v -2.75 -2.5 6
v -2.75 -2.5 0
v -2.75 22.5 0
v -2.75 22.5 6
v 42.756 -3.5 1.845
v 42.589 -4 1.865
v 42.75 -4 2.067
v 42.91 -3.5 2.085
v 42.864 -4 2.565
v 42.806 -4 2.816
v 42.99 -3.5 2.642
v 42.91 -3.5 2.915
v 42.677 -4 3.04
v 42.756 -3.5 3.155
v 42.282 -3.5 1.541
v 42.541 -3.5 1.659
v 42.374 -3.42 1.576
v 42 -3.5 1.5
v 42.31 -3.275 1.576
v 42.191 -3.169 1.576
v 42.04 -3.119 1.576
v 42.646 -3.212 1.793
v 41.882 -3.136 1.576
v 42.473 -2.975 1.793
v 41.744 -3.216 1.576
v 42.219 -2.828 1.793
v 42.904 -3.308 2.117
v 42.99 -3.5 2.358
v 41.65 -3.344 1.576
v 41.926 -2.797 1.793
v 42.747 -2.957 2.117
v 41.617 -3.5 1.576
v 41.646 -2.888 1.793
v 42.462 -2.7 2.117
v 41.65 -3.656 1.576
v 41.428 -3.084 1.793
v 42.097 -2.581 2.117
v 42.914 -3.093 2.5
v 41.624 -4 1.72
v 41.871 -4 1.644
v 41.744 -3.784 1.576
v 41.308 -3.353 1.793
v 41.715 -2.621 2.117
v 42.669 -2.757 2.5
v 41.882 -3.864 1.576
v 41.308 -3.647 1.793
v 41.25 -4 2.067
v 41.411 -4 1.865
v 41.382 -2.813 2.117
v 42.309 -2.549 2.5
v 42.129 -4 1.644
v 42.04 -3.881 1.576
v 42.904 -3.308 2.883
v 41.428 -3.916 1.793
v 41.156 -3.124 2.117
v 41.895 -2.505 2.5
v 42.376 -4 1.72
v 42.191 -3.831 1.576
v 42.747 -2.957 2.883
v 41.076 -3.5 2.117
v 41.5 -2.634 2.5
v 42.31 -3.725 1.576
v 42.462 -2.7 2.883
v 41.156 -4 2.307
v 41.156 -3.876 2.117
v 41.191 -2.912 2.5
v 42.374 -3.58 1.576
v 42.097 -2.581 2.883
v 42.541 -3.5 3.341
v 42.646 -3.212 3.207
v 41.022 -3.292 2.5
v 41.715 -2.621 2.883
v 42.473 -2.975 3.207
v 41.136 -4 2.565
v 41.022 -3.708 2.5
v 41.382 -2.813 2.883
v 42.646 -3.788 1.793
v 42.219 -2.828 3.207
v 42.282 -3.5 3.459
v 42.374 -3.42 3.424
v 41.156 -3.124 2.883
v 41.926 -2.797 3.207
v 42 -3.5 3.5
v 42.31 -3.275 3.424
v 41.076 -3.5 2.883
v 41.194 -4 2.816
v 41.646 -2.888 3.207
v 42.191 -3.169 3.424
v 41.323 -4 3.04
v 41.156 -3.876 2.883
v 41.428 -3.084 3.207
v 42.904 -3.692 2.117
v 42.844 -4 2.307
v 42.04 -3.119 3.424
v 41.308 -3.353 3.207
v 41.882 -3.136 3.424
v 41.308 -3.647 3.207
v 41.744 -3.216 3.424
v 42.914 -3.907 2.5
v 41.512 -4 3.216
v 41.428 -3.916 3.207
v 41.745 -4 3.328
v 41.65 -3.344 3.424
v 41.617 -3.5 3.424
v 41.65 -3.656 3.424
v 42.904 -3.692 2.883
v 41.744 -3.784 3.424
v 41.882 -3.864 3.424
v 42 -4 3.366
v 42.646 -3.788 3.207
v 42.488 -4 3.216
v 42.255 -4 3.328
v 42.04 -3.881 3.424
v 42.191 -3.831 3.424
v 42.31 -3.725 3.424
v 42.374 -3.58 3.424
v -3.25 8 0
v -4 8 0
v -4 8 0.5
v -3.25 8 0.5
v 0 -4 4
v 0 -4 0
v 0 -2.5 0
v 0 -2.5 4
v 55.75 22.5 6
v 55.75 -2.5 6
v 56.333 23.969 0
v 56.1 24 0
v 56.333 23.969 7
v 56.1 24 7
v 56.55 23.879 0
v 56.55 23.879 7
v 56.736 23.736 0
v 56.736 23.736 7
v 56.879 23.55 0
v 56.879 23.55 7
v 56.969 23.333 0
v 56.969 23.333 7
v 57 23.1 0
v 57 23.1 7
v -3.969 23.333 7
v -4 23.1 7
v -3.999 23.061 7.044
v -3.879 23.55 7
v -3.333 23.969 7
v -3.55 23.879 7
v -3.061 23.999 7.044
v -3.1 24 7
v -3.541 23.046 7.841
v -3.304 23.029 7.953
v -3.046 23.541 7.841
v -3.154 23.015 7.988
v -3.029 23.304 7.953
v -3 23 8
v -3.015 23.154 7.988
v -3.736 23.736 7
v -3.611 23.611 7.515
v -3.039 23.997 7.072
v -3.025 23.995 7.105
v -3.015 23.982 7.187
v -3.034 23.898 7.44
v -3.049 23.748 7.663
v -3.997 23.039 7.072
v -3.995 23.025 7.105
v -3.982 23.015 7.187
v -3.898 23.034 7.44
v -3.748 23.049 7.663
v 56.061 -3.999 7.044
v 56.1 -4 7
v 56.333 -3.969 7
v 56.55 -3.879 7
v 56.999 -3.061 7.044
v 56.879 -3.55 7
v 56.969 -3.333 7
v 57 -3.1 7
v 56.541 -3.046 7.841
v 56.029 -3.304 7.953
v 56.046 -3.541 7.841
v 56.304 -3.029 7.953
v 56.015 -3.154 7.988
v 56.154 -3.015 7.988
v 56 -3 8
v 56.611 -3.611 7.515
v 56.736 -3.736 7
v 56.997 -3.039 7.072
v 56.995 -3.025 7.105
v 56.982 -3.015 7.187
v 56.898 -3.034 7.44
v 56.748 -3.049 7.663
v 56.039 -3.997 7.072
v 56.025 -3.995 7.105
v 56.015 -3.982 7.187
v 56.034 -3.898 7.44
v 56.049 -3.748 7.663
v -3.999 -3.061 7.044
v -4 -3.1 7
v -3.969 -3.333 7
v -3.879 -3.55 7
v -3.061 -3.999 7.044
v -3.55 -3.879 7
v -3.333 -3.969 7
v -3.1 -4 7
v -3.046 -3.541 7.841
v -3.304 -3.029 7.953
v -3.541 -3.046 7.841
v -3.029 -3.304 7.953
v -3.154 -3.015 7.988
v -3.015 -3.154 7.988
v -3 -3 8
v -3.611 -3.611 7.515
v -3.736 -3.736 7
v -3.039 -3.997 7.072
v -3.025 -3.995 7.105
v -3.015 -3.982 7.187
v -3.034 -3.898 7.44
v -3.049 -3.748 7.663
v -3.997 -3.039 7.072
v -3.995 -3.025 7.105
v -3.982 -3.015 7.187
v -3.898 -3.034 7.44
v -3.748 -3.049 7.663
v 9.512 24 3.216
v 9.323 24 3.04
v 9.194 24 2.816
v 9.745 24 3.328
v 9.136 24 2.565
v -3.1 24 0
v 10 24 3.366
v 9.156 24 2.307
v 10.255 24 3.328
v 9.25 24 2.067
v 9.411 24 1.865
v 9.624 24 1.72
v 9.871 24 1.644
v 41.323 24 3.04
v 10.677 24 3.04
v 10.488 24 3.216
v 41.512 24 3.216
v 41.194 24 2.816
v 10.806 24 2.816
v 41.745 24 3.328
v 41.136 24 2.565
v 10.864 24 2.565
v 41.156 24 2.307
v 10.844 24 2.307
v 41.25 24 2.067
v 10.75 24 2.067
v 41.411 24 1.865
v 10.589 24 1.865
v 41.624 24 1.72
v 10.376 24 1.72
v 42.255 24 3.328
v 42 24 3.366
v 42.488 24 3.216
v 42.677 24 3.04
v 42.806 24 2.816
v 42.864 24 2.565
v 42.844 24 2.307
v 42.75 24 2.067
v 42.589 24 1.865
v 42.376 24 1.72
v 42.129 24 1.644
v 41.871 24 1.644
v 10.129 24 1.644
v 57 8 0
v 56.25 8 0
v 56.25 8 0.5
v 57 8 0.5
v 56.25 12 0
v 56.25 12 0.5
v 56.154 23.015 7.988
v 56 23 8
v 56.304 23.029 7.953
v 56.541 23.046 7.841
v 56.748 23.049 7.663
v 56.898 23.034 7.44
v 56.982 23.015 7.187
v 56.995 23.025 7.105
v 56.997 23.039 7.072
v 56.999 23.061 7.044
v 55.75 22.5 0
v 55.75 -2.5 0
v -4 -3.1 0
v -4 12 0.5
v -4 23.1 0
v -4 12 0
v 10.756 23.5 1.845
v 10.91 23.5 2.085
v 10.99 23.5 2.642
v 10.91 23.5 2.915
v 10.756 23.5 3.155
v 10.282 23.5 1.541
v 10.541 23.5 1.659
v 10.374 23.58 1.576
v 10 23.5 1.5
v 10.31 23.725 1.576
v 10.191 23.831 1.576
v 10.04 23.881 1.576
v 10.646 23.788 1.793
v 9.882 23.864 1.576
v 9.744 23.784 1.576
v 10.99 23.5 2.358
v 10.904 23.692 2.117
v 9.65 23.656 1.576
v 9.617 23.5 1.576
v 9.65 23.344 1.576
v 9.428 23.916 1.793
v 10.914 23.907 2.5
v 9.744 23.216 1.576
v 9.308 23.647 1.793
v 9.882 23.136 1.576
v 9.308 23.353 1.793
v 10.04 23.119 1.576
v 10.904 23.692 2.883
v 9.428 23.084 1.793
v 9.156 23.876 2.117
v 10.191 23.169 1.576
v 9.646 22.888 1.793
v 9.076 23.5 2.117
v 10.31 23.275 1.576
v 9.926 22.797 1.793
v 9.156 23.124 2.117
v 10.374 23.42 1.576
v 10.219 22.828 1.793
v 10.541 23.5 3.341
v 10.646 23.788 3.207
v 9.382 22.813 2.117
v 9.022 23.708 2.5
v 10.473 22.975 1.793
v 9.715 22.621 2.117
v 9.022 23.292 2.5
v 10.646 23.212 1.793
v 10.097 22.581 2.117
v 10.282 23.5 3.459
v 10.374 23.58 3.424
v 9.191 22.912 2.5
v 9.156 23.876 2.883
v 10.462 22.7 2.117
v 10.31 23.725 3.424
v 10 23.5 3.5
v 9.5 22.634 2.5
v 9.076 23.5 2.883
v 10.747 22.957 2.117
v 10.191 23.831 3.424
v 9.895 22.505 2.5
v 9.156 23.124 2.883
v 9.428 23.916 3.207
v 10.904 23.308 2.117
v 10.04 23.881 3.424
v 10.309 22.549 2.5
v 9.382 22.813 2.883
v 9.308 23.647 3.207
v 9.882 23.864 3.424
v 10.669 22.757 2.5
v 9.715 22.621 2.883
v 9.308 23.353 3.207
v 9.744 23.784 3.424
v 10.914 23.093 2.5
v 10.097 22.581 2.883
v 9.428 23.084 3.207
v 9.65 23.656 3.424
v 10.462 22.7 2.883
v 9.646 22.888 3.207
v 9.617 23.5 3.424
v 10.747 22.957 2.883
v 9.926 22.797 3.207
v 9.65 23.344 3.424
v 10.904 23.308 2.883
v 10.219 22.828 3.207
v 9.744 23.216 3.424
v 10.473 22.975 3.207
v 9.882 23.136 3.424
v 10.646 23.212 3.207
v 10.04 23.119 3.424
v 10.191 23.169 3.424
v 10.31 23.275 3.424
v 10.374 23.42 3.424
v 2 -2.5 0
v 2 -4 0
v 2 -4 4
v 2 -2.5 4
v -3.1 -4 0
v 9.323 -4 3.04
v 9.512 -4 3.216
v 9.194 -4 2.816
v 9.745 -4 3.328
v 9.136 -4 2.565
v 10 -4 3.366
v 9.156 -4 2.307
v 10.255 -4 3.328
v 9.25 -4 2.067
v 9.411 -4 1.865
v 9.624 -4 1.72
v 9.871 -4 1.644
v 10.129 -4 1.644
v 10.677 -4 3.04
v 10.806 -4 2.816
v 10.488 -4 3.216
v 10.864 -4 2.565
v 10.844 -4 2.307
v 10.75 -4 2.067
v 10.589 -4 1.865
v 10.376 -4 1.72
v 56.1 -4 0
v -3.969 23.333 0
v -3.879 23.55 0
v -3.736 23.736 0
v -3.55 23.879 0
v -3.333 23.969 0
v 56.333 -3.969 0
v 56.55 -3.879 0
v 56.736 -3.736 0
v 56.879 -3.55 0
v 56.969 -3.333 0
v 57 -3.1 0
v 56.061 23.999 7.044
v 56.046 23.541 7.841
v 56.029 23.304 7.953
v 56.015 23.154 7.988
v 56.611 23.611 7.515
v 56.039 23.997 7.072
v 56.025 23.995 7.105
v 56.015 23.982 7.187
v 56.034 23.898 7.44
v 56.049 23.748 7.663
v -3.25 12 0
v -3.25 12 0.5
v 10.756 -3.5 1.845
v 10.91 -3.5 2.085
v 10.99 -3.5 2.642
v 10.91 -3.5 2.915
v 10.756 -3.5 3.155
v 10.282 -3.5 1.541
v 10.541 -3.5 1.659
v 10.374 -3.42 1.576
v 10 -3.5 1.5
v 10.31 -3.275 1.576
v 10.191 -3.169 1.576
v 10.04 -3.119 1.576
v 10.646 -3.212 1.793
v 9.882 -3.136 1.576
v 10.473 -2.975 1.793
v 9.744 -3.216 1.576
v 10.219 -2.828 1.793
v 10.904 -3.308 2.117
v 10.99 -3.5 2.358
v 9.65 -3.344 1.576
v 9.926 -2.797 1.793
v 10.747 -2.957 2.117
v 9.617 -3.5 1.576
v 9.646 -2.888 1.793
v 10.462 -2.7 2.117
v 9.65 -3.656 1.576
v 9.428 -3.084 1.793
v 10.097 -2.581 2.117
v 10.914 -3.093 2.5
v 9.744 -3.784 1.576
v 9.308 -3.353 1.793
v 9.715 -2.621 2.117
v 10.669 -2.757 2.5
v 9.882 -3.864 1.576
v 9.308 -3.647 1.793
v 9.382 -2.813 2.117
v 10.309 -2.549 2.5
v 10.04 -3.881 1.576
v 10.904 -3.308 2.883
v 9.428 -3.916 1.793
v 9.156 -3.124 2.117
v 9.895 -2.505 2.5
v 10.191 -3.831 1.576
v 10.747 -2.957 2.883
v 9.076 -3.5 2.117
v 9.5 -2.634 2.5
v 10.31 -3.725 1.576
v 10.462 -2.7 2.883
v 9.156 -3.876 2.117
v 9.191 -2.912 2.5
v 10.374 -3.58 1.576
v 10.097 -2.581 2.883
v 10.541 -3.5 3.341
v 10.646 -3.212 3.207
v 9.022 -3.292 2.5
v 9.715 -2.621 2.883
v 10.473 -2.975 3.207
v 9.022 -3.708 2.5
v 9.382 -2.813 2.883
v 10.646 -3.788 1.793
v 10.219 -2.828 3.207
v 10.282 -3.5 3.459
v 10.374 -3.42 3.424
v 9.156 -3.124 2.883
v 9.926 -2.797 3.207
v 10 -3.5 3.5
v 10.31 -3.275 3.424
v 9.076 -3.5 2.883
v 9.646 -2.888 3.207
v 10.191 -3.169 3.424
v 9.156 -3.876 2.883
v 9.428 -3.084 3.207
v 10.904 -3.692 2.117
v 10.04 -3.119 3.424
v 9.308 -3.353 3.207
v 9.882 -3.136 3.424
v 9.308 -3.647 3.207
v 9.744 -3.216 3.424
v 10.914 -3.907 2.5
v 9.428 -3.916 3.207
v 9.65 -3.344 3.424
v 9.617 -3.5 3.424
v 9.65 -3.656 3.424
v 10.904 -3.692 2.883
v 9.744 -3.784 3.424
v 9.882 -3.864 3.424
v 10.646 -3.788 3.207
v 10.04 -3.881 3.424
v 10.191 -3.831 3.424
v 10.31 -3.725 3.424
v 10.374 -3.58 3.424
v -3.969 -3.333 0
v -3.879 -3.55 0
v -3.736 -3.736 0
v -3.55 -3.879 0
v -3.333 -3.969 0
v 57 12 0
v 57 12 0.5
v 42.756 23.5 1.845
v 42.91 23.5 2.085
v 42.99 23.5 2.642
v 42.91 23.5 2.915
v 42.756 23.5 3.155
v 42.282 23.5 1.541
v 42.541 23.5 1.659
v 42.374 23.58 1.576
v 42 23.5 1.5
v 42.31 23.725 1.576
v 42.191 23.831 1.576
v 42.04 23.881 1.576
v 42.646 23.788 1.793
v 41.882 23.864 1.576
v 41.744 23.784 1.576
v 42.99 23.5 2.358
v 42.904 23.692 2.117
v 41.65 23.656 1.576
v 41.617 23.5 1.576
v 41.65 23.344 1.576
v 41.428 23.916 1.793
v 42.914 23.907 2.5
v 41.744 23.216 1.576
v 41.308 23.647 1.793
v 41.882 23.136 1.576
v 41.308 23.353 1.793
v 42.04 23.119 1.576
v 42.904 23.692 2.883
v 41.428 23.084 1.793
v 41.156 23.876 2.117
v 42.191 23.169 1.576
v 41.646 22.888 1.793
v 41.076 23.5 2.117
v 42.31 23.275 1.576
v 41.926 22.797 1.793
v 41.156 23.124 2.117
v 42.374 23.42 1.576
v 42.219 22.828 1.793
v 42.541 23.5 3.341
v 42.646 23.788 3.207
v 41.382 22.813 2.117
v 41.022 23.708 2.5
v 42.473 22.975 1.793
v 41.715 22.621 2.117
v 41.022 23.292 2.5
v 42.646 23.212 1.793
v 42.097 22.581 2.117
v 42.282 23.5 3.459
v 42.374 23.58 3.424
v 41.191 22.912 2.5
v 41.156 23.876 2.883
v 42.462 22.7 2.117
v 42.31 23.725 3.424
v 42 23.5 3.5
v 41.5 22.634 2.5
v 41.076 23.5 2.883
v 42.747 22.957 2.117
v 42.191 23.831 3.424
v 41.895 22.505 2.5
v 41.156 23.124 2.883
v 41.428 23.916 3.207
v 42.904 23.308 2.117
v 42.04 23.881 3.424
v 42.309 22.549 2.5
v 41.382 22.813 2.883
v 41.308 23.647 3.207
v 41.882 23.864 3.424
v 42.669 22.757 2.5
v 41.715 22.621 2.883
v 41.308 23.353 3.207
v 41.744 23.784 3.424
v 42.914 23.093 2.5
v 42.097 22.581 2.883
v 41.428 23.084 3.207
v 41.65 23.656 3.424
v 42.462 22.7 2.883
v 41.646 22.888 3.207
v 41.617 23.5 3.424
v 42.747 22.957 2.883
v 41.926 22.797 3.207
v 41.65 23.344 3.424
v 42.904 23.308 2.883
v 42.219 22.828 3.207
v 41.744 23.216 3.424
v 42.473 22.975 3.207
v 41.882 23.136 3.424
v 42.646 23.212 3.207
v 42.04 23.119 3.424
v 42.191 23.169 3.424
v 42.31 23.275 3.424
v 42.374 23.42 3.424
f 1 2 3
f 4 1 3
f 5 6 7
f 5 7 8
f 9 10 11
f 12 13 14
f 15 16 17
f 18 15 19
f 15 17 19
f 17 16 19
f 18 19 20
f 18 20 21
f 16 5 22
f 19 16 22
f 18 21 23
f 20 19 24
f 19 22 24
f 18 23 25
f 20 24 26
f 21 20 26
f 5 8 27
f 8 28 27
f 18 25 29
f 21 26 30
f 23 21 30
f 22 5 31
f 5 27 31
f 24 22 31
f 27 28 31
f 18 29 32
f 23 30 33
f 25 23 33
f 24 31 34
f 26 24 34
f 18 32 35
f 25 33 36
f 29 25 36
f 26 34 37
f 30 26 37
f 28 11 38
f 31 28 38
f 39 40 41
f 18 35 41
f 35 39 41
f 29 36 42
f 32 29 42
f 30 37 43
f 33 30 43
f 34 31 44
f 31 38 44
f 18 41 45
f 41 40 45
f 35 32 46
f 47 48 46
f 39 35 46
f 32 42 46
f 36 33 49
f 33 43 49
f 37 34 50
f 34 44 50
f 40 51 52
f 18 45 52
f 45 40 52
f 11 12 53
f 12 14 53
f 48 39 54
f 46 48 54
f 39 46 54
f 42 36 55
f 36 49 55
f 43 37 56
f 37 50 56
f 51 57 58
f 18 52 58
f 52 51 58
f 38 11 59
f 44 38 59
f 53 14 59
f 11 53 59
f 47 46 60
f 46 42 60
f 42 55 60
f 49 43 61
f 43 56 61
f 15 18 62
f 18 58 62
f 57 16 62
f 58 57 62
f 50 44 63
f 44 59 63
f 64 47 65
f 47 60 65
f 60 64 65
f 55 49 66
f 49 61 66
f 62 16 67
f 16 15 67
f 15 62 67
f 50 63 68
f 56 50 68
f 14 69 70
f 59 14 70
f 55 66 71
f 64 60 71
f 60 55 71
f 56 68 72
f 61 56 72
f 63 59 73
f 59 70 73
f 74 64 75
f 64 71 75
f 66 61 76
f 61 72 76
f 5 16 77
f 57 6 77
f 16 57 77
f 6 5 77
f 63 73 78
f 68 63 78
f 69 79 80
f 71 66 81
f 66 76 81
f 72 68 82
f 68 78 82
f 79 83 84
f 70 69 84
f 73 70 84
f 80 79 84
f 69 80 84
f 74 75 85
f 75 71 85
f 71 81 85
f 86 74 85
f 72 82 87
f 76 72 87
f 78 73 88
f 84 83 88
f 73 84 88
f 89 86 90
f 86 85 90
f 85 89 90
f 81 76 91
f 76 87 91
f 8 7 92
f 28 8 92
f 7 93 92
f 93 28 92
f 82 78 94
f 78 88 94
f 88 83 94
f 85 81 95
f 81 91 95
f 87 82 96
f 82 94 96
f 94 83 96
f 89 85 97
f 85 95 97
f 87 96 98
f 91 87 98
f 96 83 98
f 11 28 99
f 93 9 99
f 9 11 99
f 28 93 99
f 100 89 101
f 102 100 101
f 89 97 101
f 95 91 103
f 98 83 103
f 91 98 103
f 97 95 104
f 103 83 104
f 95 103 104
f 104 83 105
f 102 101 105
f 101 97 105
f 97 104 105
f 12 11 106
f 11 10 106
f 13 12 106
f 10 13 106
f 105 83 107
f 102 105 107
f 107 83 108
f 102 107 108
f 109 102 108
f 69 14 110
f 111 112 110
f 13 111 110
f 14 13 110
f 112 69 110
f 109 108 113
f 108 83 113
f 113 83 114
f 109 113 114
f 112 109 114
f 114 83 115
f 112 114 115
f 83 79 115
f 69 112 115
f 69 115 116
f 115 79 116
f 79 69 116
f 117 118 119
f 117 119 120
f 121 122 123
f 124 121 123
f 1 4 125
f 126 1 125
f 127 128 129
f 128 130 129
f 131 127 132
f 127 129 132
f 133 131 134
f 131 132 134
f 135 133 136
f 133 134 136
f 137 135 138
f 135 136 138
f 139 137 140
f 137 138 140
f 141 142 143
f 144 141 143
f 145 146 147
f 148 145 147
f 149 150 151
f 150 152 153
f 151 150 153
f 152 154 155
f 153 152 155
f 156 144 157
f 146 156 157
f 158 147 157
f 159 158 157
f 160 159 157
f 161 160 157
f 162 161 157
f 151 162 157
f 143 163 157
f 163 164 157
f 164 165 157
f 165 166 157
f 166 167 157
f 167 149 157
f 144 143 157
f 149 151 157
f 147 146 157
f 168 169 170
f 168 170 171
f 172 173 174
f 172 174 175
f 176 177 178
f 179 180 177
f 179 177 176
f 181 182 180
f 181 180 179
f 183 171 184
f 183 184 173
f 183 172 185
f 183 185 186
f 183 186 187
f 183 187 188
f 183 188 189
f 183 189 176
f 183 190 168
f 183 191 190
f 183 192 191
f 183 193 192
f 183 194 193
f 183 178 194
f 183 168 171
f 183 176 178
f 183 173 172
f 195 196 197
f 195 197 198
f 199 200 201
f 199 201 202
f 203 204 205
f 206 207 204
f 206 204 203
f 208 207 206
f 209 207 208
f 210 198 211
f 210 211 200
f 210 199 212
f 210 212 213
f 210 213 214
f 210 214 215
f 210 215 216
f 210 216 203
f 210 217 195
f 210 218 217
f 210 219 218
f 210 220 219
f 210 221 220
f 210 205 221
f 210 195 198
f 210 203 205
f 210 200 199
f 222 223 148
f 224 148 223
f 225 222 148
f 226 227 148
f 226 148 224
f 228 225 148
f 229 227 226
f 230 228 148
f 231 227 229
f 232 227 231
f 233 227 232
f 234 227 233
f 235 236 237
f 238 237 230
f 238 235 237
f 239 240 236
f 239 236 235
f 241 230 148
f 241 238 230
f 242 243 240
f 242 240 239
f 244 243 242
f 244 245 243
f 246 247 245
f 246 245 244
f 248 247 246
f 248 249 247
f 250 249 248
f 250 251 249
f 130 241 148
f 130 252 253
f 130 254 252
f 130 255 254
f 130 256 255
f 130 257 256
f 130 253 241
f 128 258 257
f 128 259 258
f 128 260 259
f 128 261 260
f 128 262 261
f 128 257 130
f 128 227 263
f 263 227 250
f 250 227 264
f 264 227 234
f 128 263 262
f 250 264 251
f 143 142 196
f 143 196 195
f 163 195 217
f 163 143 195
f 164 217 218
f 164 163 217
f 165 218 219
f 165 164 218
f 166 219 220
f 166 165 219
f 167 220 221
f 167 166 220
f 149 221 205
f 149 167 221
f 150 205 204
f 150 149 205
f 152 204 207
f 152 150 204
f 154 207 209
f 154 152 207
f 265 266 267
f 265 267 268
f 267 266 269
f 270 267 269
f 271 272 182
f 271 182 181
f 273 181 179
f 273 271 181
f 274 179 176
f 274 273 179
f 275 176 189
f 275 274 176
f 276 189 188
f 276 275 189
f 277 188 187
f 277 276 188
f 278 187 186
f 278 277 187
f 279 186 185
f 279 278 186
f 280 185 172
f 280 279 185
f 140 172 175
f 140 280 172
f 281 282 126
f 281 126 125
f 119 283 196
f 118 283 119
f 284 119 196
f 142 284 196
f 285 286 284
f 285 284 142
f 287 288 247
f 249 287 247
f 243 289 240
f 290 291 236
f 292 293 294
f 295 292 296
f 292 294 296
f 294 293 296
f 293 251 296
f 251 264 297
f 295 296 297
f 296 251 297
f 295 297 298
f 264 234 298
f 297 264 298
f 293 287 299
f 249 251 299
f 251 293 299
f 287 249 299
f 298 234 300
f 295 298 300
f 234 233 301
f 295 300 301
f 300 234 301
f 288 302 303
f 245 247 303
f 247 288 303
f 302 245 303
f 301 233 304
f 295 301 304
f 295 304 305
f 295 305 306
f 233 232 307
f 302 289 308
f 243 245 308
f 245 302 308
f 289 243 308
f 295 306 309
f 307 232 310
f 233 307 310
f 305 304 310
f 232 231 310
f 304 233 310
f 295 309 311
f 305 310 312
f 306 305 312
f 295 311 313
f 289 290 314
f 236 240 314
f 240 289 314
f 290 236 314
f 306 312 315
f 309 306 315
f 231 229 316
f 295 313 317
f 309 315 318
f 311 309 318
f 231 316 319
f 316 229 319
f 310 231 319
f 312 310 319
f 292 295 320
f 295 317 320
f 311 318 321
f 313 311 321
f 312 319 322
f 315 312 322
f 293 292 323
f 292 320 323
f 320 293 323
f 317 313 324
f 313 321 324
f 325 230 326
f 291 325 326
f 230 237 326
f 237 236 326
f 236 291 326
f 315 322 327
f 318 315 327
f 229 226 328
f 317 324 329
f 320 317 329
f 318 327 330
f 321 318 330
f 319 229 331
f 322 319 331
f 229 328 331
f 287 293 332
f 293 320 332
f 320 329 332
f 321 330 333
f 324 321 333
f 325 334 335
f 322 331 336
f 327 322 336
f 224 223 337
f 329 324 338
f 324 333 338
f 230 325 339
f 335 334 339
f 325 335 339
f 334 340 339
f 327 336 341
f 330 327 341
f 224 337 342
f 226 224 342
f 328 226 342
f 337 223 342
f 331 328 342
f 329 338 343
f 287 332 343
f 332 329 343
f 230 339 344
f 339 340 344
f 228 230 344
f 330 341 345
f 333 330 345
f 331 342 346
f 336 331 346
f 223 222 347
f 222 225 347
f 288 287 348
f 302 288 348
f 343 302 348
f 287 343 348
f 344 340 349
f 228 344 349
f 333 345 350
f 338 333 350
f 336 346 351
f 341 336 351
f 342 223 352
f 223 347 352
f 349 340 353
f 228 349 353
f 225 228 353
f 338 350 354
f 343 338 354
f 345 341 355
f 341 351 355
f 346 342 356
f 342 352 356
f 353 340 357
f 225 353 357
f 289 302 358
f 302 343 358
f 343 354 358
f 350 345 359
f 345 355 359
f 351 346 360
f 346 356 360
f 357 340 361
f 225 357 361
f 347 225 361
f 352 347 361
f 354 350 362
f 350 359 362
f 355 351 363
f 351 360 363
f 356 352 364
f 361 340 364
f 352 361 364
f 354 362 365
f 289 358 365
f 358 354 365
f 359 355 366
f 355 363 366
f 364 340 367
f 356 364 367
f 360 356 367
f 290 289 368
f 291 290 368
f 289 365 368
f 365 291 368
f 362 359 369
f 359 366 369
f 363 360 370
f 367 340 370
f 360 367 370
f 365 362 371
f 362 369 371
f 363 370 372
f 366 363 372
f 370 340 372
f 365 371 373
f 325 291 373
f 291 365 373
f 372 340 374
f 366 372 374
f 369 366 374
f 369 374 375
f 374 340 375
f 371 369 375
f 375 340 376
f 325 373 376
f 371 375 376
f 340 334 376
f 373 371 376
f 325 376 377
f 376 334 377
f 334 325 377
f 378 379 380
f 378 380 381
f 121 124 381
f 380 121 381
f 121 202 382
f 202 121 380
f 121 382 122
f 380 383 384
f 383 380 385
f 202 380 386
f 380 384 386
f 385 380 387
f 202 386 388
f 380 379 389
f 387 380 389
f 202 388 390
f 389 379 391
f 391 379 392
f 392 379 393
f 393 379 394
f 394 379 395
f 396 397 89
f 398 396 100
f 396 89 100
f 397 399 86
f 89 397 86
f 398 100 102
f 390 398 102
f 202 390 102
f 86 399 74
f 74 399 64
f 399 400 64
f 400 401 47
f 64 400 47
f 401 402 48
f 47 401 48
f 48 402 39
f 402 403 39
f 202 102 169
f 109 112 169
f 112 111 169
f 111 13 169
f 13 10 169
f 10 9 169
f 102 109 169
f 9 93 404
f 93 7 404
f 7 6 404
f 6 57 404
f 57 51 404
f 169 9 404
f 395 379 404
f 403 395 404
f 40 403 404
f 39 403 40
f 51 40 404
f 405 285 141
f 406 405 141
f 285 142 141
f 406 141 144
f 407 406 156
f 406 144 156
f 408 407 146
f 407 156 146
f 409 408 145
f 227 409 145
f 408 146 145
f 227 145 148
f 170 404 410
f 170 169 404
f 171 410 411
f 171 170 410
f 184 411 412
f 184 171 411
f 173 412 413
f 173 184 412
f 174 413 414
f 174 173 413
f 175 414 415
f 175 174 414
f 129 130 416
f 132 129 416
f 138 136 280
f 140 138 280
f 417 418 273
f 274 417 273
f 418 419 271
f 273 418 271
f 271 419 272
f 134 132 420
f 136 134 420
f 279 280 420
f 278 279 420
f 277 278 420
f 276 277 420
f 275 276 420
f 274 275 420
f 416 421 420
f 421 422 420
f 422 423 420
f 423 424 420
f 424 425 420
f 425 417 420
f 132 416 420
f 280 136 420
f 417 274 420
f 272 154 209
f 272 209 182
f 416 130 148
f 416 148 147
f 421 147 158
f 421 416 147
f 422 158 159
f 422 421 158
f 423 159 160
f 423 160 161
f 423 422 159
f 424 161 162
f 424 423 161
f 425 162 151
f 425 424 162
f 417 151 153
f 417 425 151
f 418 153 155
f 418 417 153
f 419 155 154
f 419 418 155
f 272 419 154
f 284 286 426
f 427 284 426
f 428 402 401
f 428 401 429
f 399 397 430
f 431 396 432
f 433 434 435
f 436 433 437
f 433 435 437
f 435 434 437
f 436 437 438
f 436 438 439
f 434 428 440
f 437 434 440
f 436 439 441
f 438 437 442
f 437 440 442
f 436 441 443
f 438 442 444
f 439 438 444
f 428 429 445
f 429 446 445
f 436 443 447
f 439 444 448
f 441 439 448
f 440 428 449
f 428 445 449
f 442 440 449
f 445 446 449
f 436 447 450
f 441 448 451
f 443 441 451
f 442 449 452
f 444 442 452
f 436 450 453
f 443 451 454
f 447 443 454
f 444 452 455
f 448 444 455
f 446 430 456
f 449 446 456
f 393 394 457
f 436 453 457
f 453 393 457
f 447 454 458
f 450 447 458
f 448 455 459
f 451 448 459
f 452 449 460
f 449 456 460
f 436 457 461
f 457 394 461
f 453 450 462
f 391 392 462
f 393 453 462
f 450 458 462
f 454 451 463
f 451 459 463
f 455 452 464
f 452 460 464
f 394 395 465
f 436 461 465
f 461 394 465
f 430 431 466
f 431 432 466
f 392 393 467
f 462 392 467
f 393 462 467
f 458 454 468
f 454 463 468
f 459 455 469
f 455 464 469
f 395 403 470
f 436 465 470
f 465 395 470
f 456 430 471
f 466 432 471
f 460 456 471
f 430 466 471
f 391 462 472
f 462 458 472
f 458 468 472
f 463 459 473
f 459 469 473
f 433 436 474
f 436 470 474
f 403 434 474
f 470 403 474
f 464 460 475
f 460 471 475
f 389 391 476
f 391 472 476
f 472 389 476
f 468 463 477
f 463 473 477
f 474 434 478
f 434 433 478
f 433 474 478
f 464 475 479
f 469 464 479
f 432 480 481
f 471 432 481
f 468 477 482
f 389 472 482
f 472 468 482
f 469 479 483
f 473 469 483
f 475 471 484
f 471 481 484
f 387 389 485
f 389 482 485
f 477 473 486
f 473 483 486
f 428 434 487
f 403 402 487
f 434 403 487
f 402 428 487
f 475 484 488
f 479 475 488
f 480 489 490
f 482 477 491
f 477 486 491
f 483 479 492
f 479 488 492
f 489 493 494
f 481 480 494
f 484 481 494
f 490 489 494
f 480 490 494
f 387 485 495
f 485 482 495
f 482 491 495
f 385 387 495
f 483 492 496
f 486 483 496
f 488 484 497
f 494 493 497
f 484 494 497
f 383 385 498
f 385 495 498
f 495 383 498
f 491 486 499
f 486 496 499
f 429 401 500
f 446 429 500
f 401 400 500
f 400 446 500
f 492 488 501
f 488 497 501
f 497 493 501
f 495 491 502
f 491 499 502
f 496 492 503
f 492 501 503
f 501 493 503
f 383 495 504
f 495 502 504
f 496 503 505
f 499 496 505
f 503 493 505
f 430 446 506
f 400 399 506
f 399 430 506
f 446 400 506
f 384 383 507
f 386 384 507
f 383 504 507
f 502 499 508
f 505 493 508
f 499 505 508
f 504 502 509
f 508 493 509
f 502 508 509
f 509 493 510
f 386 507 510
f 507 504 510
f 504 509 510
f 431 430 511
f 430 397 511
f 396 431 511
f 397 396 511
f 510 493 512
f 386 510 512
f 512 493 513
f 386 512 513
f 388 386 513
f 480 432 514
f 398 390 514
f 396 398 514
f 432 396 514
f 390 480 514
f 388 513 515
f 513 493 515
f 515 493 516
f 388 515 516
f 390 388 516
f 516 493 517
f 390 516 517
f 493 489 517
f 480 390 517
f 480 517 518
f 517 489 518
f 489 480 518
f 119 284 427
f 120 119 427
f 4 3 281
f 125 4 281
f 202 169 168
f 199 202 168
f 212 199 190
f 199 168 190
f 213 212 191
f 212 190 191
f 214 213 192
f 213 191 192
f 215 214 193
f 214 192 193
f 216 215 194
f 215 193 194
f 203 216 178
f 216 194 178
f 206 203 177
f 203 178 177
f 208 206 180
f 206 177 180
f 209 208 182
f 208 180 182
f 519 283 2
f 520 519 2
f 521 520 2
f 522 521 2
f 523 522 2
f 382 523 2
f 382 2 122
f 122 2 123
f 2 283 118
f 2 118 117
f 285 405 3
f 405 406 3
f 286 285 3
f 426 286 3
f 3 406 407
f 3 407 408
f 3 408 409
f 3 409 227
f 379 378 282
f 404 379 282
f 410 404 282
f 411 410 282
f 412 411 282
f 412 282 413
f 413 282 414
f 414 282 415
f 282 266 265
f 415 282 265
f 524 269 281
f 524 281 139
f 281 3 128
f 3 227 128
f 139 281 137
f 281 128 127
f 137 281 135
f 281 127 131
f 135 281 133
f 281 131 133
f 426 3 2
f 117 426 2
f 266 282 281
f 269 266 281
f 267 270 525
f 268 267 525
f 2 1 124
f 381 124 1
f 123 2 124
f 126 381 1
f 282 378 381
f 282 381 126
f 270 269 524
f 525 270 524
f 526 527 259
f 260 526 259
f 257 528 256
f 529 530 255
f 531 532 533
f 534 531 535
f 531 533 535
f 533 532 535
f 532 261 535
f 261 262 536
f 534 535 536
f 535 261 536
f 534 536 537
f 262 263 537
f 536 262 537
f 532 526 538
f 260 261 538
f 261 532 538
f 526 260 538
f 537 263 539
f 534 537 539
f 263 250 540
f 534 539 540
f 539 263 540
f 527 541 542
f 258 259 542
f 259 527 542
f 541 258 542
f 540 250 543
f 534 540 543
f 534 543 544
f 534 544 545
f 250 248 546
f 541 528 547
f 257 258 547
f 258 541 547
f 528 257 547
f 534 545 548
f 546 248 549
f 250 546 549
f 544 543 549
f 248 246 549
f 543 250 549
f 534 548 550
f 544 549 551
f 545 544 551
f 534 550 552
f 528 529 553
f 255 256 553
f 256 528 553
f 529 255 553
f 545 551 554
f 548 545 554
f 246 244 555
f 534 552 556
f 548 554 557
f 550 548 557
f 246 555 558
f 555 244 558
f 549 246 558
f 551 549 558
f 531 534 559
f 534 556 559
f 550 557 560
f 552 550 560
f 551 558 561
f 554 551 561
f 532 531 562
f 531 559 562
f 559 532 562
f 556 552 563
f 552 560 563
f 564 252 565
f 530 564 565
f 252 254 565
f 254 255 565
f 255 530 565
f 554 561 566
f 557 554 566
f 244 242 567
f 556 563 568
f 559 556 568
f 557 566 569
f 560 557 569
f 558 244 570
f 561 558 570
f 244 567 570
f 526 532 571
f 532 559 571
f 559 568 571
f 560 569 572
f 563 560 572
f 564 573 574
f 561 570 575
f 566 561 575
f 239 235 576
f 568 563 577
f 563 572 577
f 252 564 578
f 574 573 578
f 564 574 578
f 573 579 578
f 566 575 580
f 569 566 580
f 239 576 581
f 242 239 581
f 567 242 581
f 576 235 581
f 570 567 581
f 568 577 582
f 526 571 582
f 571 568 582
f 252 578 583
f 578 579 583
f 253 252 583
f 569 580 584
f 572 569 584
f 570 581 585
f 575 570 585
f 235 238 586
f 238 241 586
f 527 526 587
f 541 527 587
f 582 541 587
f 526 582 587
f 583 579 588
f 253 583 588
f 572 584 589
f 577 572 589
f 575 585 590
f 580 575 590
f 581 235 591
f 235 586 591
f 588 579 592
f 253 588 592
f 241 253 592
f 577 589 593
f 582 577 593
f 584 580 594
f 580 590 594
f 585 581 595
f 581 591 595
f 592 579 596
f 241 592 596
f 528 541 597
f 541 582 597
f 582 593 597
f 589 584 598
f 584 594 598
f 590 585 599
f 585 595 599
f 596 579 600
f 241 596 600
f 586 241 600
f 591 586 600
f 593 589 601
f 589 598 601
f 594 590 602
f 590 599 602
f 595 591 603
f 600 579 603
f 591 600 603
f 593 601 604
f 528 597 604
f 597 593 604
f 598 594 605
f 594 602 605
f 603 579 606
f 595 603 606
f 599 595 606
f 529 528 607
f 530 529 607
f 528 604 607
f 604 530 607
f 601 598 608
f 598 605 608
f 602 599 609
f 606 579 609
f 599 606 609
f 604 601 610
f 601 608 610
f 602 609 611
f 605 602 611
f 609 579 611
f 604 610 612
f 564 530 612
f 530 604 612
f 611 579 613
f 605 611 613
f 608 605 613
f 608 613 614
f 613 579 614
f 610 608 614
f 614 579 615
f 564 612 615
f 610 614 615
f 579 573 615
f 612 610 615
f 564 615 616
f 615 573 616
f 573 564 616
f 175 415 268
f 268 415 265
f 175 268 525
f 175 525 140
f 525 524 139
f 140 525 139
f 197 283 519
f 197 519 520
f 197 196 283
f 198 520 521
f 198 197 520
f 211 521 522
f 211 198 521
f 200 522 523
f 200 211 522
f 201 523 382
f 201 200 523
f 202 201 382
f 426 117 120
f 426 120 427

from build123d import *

# Parameters (mm, degrees)
BOX015_W     = 2
BOX015_H     = 4
BOX015_DEPTH = 0.5
BOX014_W     = 2
BOX014_H     = 4
BOX014_DEPTH = 0.5
BOX004_W     = 2
BOX004_H     = 2
BOX004_DEPTH = 6
BOX001_W     = 58.5
BOX001_H     = 25
BOX001_DEPTH = 8
BOX002_W     = 61
BOX002_H     = 28
BOX002_DEPTH = 8
FILLET_R     = 1
FILLET004_R  = 0.9


with BuildPart() as w_rfel010:
    # Box015 → Box015 (new body)
    with BuildSketch(Plane(origin=(56.25, 8, 0), x_dir=(1, 0, 0), z_dir=(0, 0, 1))):
        with Locations((1, 2)):
            Rectangle(BOX015_W, BOX015_H)
    extrude(amount=BOX015_DEPTH)


with BuildPart() as w_rfel009:
    # Box014 → Box014 (new body)
    with BuildSketch(Plane(origin=(-5.25, 8, 0), x_dir=(1, 0, 0), z_dir=(0, 0, 1))):
        with Locations((1, 2)):
            Rectangle(BOX014_W, BOX014_H)
    extrude(amount=BOX014_DEPTH)


with BuildPart() as w_rfel003:
    # Box004 → Box004 (new body)
    with BuildSketch(Plane(origin=(0, -4.25, -2), x_dir=(1, 0, 0), z_dir=(0, 0, 1))):
        with Locations((1, 1)):
            Rectangle(BOX004_W, BOX004_H)
    extrude(amount=BOX004_DEPTH)


with BuildPart() as noppel1:
    # Sphere → Sphere (revolve)
    with BuildSketch(Plane(origin=(10, -2, 2), x_dir=(1, 0, 0), z_dir=(0, -1, 0))):
        with BuildLine():
            ThreePointArc((0, -1), (1, 0), (0, 1))
            Line((0, 1), (0, -1))
        make_face()
    revolve(axis=Axis((10, -2, 2), (0, 0, 1)))


with BuildPart() as noppel006:
    # Link006 base: copy of Noppel1
    add(noppel1.part)


with BuildPart() as noppel006_1:
    # Link006 placement: moved
    add(noppel006.part.moved(Location((32, 24, -0.5))))


with BuildPart() as noppel006_2:
    # Link008 placement: moved
    add(noppel006_1.part.moved(Location((0, 1.500002, 1))))


with BuildPart() as noppel005:
    # Link005 base: copy of Noppel1
    add(noppel1.part)


with BuildPart() as noppel005_1:
    # Link005 placement: moved
    add(noppel005.part.moved(Location((0, 24, -0.5))))


with BuildPart() as noppel005_2:
    # Link007 placement: moved
    add(noppel005_1.part.moved(Location((0, 1.5, 0.999999))))


with BuildPart() as noppel004:
    # Link004 base: copy of Noppel1
    add(noppel1.part)


with BuildPart() as noppel004_1:
    # Link004 placement: moved
    add(noppel004.part.moved(Location((0, -1.500001, 0.5))))


with BuildPart() as noppel003:
    # Link002 base: copy of Noppel1
    add(noppel1.part)


with BuildPart() as noppel003_1:
    # Link002 placement: moved
    add(noppel003.part.moved(Location((32, 0, -0.5))))


with BuildPart() as noppel003_2:
    # Link003 placement: moved
    add(noppel003_1.part.moved(Location((0, -1.5, 1))))


with BuildPart() as base:
    # Box001 → Box001 (new body)
    with BuildSketch(Plane(origin=(-2.75, -2.5, -2), x_dir=(1, 0, 0), z_dir=(0, 0, 1))):
        with Locations((29.25, 12.5)):
            Rectangle(BOX001_W, BOX001_H)
    extrude(amount=BOX001_DEPTH)


with BuildPart() as cut014:
    # Box002 → Box002 (new body)
    with BuildSketch(Plane(origin=(-4, -4, 0), x_dir=(1, 0, 0), z_dir=(0, 0, 1))):
        with Locations((30.5, 14)):
            Rectangle(BOX002_W, BOX002_H)
    extrude(amount=BOX002_DEPTH)

    # Cut001: cut Base
    add(base.part, mode=Mode.SUBTRACT)

    # Cut002: cut Noppel003
    add(noppel003_2.part, mode=Mode.SUBTRACT)

    # Cut003: cut Noppel004
    add(noppel004_1.part, mode=Mode.SUBTRACT)

    # Cut004: cut Noppel005
    add(noppel005_2.part, mode=Mode.SUBTRACT)

    # Cut005: cut Noppel006
    add(noppel006_2.part, mode=Mode.SUBTRACT)

    # Cut007: cut Würfel003
    add(w_rfel003.part, mode=Mode.SUBTRACT)

    # Fillet
    fillet_edges = [cut014.edges().sort_by_distance(p)[0] for p in [
        (-4, 10, 8),
        (26.5, -4, 8),
        (26.5, 24, 8),
        (57, 10, 8),
    ]]
    fillet(fillet_edges, radius=FILLET_R)

    # Fillet004
    fillet004_edges = [cut014.edges().sort_by_distance(p)[0] for p in [
        (-4, -4, 3.5),
        (-4, 24, 3.5),
        (57, -4, 3.5),
        (57, 24, 3.5),
    ]]
    fillet(fillet004_edges, radius=FILLET004_R)

    # Cut: cut Würfel009
    add(w_rfel009.part, mode=Mode.SUBTRACT)

    # Cut012: cut Würfel010
    add(w_rfel010.part, mode=Mode.SUBTRACT)


solid = cut014.part
